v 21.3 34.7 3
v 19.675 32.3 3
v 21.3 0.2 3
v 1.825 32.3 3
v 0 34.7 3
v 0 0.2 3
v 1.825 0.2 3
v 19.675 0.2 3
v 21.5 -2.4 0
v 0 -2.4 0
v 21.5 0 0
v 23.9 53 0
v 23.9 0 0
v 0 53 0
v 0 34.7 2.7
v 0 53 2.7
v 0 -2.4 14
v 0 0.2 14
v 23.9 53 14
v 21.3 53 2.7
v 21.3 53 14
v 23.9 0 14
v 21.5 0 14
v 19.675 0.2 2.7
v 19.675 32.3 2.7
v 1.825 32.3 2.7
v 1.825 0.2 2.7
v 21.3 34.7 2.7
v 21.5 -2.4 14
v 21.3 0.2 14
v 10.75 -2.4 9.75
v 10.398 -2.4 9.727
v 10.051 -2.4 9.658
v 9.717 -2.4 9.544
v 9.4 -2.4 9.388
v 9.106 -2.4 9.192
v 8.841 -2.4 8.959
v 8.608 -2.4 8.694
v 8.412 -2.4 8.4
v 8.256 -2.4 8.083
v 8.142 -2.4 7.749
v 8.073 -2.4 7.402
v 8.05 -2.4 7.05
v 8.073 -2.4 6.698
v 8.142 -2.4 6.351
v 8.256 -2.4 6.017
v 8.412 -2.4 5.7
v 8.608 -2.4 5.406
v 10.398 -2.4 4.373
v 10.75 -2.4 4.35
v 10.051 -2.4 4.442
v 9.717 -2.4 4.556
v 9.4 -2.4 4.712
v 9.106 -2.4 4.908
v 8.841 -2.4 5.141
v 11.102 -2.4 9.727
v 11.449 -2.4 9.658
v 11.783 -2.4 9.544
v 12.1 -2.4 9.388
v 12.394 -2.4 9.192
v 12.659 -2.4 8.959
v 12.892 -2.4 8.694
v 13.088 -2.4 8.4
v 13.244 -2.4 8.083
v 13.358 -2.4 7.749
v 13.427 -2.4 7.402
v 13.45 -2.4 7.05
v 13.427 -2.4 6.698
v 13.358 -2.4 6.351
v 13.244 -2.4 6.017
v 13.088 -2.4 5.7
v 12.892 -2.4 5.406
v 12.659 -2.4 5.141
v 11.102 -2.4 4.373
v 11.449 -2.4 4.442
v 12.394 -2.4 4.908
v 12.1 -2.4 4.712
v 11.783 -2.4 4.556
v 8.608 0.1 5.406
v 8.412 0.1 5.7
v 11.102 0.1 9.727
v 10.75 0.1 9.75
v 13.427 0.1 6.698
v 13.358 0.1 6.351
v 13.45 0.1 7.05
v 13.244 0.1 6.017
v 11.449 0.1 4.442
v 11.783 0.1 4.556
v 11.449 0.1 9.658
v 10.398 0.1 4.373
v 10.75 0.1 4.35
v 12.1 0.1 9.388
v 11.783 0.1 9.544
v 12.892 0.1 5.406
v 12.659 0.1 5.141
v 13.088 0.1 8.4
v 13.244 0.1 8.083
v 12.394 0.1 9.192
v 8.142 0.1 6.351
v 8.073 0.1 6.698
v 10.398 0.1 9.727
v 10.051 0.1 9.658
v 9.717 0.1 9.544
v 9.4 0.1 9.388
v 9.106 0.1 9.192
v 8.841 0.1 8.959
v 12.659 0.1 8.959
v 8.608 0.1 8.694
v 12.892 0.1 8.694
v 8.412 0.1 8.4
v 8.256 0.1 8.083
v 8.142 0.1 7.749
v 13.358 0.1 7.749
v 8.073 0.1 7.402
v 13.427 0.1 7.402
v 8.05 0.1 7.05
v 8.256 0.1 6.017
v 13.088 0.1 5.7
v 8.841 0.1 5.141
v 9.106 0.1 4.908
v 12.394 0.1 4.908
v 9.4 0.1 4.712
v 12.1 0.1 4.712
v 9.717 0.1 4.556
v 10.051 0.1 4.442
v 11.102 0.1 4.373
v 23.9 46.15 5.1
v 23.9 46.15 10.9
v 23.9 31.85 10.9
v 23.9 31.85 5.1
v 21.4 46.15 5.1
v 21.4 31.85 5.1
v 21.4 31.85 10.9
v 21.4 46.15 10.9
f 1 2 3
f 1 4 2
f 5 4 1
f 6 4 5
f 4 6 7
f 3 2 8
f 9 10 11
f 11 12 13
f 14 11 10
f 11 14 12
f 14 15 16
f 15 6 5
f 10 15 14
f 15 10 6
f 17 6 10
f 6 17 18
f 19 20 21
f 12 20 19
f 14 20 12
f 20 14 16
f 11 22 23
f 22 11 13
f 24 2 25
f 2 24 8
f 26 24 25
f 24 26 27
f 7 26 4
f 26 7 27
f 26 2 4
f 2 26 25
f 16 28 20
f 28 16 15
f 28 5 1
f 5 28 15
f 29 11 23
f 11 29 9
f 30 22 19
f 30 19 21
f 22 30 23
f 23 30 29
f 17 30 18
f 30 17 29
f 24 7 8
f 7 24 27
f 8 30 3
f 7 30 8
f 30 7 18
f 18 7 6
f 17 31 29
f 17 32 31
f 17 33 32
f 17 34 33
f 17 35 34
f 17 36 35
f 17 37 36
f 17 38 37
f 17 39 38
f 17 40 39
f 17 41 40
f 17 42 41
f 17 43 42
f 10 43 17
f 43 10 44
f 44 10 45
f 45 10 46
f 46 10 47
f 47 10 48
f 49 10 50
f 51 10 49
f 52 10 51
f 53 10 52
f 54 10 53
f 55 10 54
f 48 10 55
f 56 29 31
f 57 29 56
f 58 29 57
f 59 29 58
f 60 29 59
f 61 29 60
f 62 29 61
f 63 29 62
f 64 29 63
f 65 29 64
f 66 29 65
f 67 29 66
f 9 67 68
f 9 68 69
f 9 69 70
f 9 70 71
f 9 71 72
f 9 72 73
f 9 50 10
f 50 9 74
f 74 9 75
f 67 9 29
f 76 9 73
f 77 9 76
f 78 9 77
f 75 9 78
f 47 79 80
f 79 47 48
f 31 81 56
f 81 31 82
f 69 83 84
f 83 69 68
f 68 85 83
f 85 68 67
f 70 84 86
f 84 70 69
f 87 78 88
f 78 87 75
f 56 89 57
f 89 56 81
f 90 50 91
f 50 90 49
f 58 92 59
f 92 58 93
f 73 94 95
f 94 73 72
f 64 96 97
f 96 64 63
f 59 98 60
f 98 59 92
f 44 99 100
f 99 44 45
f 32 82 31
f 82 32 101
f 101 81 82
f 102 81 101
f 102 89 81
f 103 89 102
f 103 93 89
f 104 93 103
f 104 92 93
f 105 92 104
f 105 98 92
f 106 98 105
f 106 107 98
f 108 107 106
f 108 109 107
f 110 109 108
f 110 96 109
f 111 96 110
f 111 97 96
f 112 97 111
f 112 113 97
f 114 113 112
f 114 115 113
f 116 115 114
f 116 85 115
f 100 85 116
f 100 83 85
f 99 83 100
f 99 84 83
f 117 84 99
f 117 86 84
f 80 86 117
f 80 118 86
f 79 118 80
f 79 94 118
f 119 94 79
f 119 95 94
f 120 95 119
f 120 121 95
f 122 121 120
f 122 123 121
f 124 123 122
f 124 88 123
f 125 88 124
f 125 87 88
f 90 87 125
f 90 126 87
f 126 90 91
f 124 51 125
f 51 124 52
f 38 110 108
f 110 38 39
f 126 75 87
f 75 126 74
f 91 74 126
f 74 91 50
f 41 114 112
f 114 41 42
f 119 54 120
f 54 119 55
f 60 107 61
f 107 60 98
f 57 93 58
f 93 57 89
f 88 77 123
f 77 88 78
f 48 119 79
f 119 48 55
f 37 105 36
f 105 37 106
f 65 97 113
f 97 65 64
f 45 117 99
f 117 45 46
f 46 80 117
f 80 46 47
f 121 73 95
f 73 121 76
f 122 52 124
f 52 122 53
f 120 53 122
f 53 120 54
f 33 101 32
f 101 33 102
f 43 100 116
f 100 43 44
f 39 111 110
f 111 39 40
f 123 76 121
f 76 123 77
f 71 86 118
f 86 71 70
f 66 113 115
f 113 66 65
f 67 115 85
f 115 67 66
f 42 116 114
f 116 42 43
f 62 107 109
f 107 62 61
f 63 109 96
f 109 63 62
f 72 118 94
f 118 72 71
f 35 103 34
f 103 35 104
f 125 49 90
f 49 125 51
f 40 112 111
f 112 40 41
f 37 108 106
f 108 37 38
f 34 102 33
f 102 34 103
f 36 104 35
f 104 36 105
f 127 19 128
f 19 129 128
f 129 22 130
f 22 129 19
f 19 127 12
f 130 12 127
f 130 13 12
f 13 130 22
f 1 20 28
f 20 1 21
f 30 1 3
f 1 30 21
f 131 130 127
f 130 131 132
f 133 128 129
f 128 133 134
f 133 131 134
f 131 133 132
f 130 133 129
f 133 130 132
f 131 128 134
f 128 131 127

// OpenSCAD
// file: boards.scad
// Measured board data for the speaker-dongle receiver
// (XIAO ESP32S3 + PCM5102A DAC), generated from MEASUREMENTS.md
// sections 1b and 3, plus the assembly photos from the design
// conversation. Pure parameters — no geometry here, see coupon.scad.
//
// Assembly layout: the two boards sit end to end with their header
// rows facing each other across a gap, the wiring docs/HARDWARE.md
// describes (VIN opposite VUSB, no crossed leads). The DAC's line-out
// jack is at the far end from the gap; the XIAO's USB-C is on its east
// short edge, near the gap; the antenna pigtail leaves near the XIAO's
// south-west corner.
//
// Shared coordinate system for the whole assembly:
//   X: west -> east
//   Y: north (the DAC's jack edge, Y=0) -> south (the XIAO's far edge)
//   Z: up, from the floor the boards are glued to
//
// Both boards are assumed centred on one shared X centreline — not yet
// confirmed against the real glued assembly. Check it on the coupon
// before it goes into a full shell.

// ---- PCM5102A DAC ----
dac_width               = 17.25; // X extent
dac_length              = 32;    // Y extent: jack edge (north) to header edge (south)
dac_pcb_thickness       = 1.6;
dac_jack_diameter       = 5.1;   // panel hole for the barrel
dac_jack_protrusion     = 1.5;   // past the north edge
dac_jack_y              = 5;     // north edge to barrel centre, along Y
// Body height above PCB top: measured as a 6.5mm total stack including
// the PCB, so 6.5 - dac_pcb_thickness.
dac_jack_body_height    = 6.5 - dac_pcb_thickness;
// Barrel centre height above PCB top was not measured directly.
// MEASUREMENTS.md's rule of thumb is "roughly half the body height" —
// treat this as an estimate to confirm, not a caliper reading.
dac_jack_barrel_height  = dac_jack_body_height / 2;
dac_top_component_height    = dac_jack_body_height; // the jack is the tallest thing on top
dac_bottom_component_height = 0; // confirmed: nothing on the back

// ---- XIAO ESP32S3 ----
xiao_width              = 21.5; // X extent (both header rows run this way)
xiao_length             = 18;   // Y extent: north edge (facing the DAC) to south edge
xiao_pcb_thickness      = 1.2;
xiao_usbc_width         = 9;    // on the east short edge
xiao_usbc_height        = 3.2;  // above PCB top (total stack incl. PCB measured 4.5mm, consistent)
xiao_usbc_protrusion    = 1.5;  // past the east edge
// Assumed centred on the east edge — not confirmed.
xiao_usbc_y             = xiao_length / 2;
xiao_top_component_height    = xiao_usbc_height; // the USB-C shell is the tallest thing on top
xiao_bottom_component_height = 0; // confirmed: nothing on the back

// ---- Assembly ----
board_gap = 3; // MEASUREMENTS.md gives 2-5mm with no fixed value; nominal pick

dac_y0  = 0;                      // DAC's north (jack) edge
xiao_y0 = dac_length + board_gap; // XIAO's north (header) edge

assembly_width  = max(dac_width, xiao_width);
assembly_length = xiao_y0 + xiao_length;

// Centring offsets so each board's own local X=0..width sits on the
// shared centreline. This is the unconfirmed assumption noted above.
dac_x0  = (assembly_width - dac_width) / 2;
xiao_x0 = (assembly_width - xiao_width) / 2;

// ---- Power ----
// Two options on the table — see MEASUREMENTS.md decision 5:
//   true  - a panel-mount USB-C jack on a 2-wire feed to VUSB/GND;
//           the XIAO's own USB-C stays inside, unused.
//   false - plug straight into the XIAO's own USB-C, which then needs
//           its own cutout on the east wall instead.
use_external_power_jack = true;

power_jack_cutout_width  = 14;  // rectangular panel cutout
power_jack_cutout_height = 5.5;
// Placed on the east wall near the XIAO's header row, for the shortest
// wire run to VUSB/GND. That's >=90 degrees from the north-facing
// audio jack, satisfying the "keep power away from audio" constraint.
// It is a flying-lead part, not fixed to a board edge, so this is a
// starting point, not a hard requirement.
power_jack_x = xiao_x0 + xiao_width; // level with the XIAO's east edge
power_jack_y = xiao_y0 + 4;          // a few mm south of the header row
power_jack_z = 8;                    // above the floor; a guess, confirm against the jack's own body

// ---- Antenna ----
antenna_sheet_width    = 18;
antenna_sheet_length   = 38;
antenna_pigtail_length = 55; // XIAO pad to the sheet, landing mid-sheet's long edge
// The pad itself is near the XIAO's south-west corner per the assembly
// photo — worth confirming exactly before routing the glue point.
// main file
// Fit-test coupon for the speaker-dongle receiver.
//
// Not a full shell: a floor to glue the two boards to, with a short
// wall standing up at each connector edge just tall enough to carry
// that connector's hole. This is the cheap, fast print that answers
// "is the hole in the right place and the right size" before spending
// hours on a full enclosure — see enclosures/README.md.
//
// "No walls" in that README means no full enclosure, not literally
// zero material at the panel edges: a cutout needs something to be cut
// out of. If a different kind of test piece was intended, say so.
//
// Retention is glue, not standoffs (MEASUREMENTS.md: both boards
// confirmed to have no mounting holes) — the recessed outlines below
// are placement guides for that glue, not structural.

include <boards.scad>

floor_thickness = 3;
wall_height     = 14;   // tall enough to clear both connectors with margin; trim once confirmed
wall_thickness  = 2.4;
overlap         = 0.2;  // small extra so walls and floor fuse instead of touching at a bare face

footprint_clearance = 0.3; // per side, so a real board drops into its outline

hole_clearance = 0.3; // per side, added to the audio jack's diameter and to the rectangular cutouts

module board_outline(x0, y0, width, length, depth) {
    translate([x0 - footprint_clearance, y0 - footprint_clearance, floor_thickness - depth])
        cube([width + 2 * footprint_clearance, length + 2 * footprint_clearance, depth + 0.1]);
}

module floor() {
    difference() {
        cube([assembly_width, assembly_length, floor_thickness]);
        board_outline(dac_x0, dac_y0, dac_width, dac_length, 0.3);
        board_outline(xiao_x0, xiao_y0, xiao_width, xiao_length, 0.3);
    }
}

// North wall: carries the DAC's line-out jack hole.
module north_wall() {
    difference() {
        translate([0, -wall_thickness, 0])
            cube([assembly_width, wall_thickness + overlap, wall_height]);

        // rotate([-90,0,0]) turns the cylinder to run along Y; the
        // translate's Y component is where that run starts, so it has
        // to begin outside the wall's outer (north) face to cut all
        // the way through to the inner face at y=0.
        translate([dac_x0 + dac_width / 2, -wall_thickness - 0.1, floor_thickness + dac_pcb_thickness + dac_jack_barrel_height])
            rotate([-90, 0, 0])
            cylinder(h = wall_thickness + 0.2, d = dac_jack_diameter + hole_clearance, $fn = 48);
    }
}

// East wall: carries either the XIAO's own USB-C cutout, or the
// external power jack cutout, depending on use_external_power_jack in
// boards.scad.
module east_wall() {
    difference() {
        translate([assembly_width - overlap, 0, 0])
            cube([wall_thickness + overlap, assembly_length, wall_height]);

        // rotate([0,-90,0]) turns the cube to run along X; the
        // translate's X component ends up as the FAR (outer) face
        // after rotation, so it has to sit past the wall's outer face
        // for the cut to reach all the way back to the inner face.
        if (use_external_power_jack) {
            translate([assembly_width + wall_thickness + 0.1, power_jack_y - (power_jack_cutout_width + hole_clearance) / 2, power_jack_z - (power_jack_cutout_height + hole_clearance) / 2])
                rotate([0, -90, 0])
                cube([power_jack_cutout_height + hole_clearance, power_jack_cutout_width + hole_clearance, wall_thickness + 0.2]);
        } else {
            translate([assembly_width + wall_thickness + 0.1, xiao_y0 + xiao_usbc_y - (xiao_usbc_width + hole_clearance) / 2, floor_thickness + xiao_pcb_thickness - hole_clearance / 2])
                rotate([0, -90, 0])
                cube([xiao_usbc_height + hole_clearance, xiao_usbc_width + hole_clearance, wall_thickness + 0.2]);
        }
    }
}

union() {
    floor();
    north_wall();
    east_wall();
}
